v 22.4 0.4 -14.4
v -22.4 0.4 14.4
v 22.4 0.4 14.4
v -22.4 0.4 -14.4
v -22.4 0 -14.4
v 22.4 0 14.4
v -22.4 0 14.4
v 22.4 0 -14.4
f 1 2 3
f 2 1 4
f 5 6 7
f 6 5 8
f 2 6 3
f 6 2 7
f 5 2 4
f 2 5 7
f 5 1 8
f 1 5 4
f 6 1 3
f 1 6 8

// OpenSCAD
// file: ../p/4-4edge.scad
use <../lib.scad>
$fa=1; $fs=0.2;
function ldraw_lib__4_4edge(realsolid=false) = [
// 0 Circle 1.0
// 0 Name: 4-4edge.dat
// 0 Author: James Jessiman
// 0 !LDRAW_ORG Primitive UPDATE 2017-01
// 0 !LICENSE Licensed under CC BY 2.0 and CC BY 4.0 : see CAreadme.txt
// 
// 0 BFC CERTIFY CCW
  [0,"BFC","CERTIFY"],
  [0,"BFC","CCW"],
// 
// 0 !HISTORY 1998-12-15 [PTadmin] Official Update 1998-10
// 0 !HISTORY 2005-12-28 [PTadmin] Official Update 2005-01
// 0 !HISTORY 2007-06-24 [PTadmin] Header formatted for Contributor Agreement
// 0 !HISTORY 2008-07-01 [PTadmin] Official Update 2008-01
// 0 !HISTORY 2017-01-15 [Steffen] BFCed
// 0 !HISTORY 2017-12-30 [PTadmin] Official Update 2017-01
// 
// 
// 2 24 1 0 0 0.9239 0 0.3827
  [2,24,1,0,0,0.9239,0,0.3827],
// 2 24 0.9239 0 0.3827 0.7071 0 0.7071
  [2,24,0.9239,0,0.3827,0.7071,0,0.7071],
// 2 24 0.7071 0 0.7071 0.3827 0 0.9239
  [2,24,0.7071,0,0.7071,0.3827,0,0.9239],
// 2 24 0.3827 0 0.9239 0 0 1
  [2,24,0.3827,0,0.9239,0,0,1],
// 2 24 0 0 1 -0.3827 0 0.9239
  [2,24,0,0,1,-0.3827,0,0.9239],
// 2 24 -0.3827 0 0.9239 -0.7071 0 0.7071
  [2,24,-0.3827,0,0.9239,-0.7071,0,0.7071],
// 2 24 -0.7071 0 0.7071 -0.9239 0 0.3827
  [2,24,-0.7071,0,0.7071,-0.9239,0,0.3827],
// 2 24 -0.9239 0 0.3827 -1 0 -0
  [2,24,-0.9239,0,0.3827,-1,0,-0],
// 2 24 -1 0 -0 -0.9239 0 -0.3827
  [2,24,-1,0,-0,-0.9239,0,-0.3827],
// 2 24 -0.9239 0 -0.3827 -0.7071 0 -0.7071
  [2,24,-0.9239,0,-0.3827,-0.7071,0,-0.7071],
// 2 24 -0.7071 0 -0.7071 -0.3827 0 -0.9239
  [2,24,-0.7071,0,-0.7071,-0.3827,0,-0.9239],
// 2 24 -0.3827 0 -0.9239 0 0 -1
  [2,24,-0.3827,0,-0.9239,0,0,-1],
// 2 24 0 0 -1 0.3827 0 -0.9239
  [2,24,0,0,-1,0.3827,0,-0.9239],
// 2 24 0.3827 0 -0.9239 0.7071 0 -0.7071
  [2,24,0.3827,0,-0.9239,0.7071,0,-0.7071],
// 2 24 0.7071 0 -0.7071 0.9239 0 -0.3827
  [2,24,0.7071,0,-0.7071,0.9239,0,-0.3827],
// 2 24 0.9239 0 -0.3827 1 0 0
  [2,24,0.9239,0,-0.3827,1,0,0],
];
module ldraw_lib__4_4edge(step=0, col=false, unit=2/5, alt=false, line=0.2, solid=!$preview)
    makepoly(ldraw_lib__4_4edge(solid), step=step, col=col, unit=unit, alt=alt, line=line, solid=solid);
ldraw_lib__4_4edge(line=0.2);
// file: ../p/4-4disc.scad
use <../lib.scad>
$fa=1; $fs=0.2;
function ldraw_lib__4_4disc(realsolid=false) = [
// 0 Disc 1.0
// 0 Name: 4-4disc.dat
// 0 Author: James Jessiman
// 0 !LDRAW_ORG Primitive UPDATE 2002-02
// 0 !LICENSE Licensed under CC BY 2.0 and CC BY 4.0 : see CAreadme.txt
// 
// 0 BFC CERTIFY CCW
  [0,"BFC","CERTIFY"],
  [0,"BFC","CCW"],
// 
// 0 !HISTORY 1998-12-15 [PTadmin] Official Update 1998-10
// 0 !HISTORY 2002-03-23 [sbliss] Added BFC statement
// 0 !HISTORY 2002-04-25 [PTadmin] Official Update 2002-02
// 0 !HISTORY 2007-06-24 [PTadmin] Header formatted for Contributor Agreement
// 0 !HISTORY 2008-07-01 [PTadmin] Official Update 2008-01
// 
// 
// 3 16 0 0 0 1 0 0 0.9239 0 0.3827
  [3,16,0,0,0,1,0,0,0.9239,0,0.3827],
// 3 16 0 0 0 0.9239 0 0.3827 0.7071 0 0.7071
  [3,16,0,0,0,0.9239,0,0.3827,0.7071,0,0.7071],
// 3 16 0 0 0 0.7071 0 0.7071 0.3827 0 0.9239
  [3,16,0,0,0,0.7071,0,0.7071,0.3827,0,0.9239],
// 3 16 0 0 0 0.3827 0 0.9239 0 0 1
  [3,16,0,0,0,0.3827,0,0.9239,0,0,1],
// 3 16 0 0 0 0 0 1 -0.3827 0 0.9239
  [3,16,0,0,0,0,0,1,-0.3827,0,0.9239],
// 3 16 0 0 0 -0.3827 0 0.9239 -0.7071 0 0.7071
  [3,16,0,0,0,-0.3827,0,0.9239,-0.7071,0,0.7071],
// 3 16 0 0 0 -0.7071 0 0.7071 -0.9239 0 0.3827
  [3,16,0,0,0,-0.7071,0,0.7071,-0.9239,0,0.3827],
// 3 16 0 0 0 -0.9239 0 0.3827 -1 0 -0
  [3,16,0,0,0,-0.9239,0,0.3827,-1,0,-0],
// 3 16 0 0 0 -1 0 -0 -0.9239 0 -0.3827
  [3,16,0,0,0,-1,0,-0,-0.9239,0,-0.3827],
// 3 16 0 0 0 -0.9239 0 -0.3827 -0.7071 0 -0.7071
  [3,16,0,0,0,-0.9239,0,-0.3827,-0.7071,0,-0.7071],
// 3 16 0 0 0 -0.7071 0 -0.7071 -0.3827 0 -0.9239
  [3,16,0,0,0,-0.7071,0,-0.7071,-0.3827,0,-0.9239],
// 3 16 0 0 0 -0.3827 0 -0.9239 0 0 -1
  [3,16,0,0,0,-0.3827,0,-0.9239,0,0,-1],
// 3 16 0 0 0 0 0 -1 0.3827 0 -0.9239
  [3,16,0,0,0,0,0,-1,0.3827,0,-0.9239],
// 3 16 0 0 0 0.3827 0 -0.9239 0.7071 0 -0.7071
  [3,16,0,0,0,0.3827,0,-0.9239,0.7071,0,-0.7071],
// 3 16 0 0 0 0.7071 0 -0.7071 0.9239 0 -0.3827
  [3,16,0,0,0,0.7071,0,-0.7071,0.9239,0,-0.3827],
// 3 16 0 0 0 0.9239 0 -0.3827 1 0 0
  [3,16,0,0,0,0.9239,0,-0.3827,1,0,0],
// 0
];
module ldraw_lib__4_4disc(step=0, col=false, unit=2/5, alt=false, line=0.2, solid=!$preview)
    makepoly(ldraw_lib__4_4disc(solid), step=step, col=col, unit=unit, alt=alt, line=line, solid=solid);
ldraw_lib__4_4disc(line=0.2);
// file: ../p/4-4cyli.scad
use <../lib.scad>
$fa=1; $fs=0.2;
function ldraw_lib__4_4cyli(realsolid=false) = [
// 0 Cylinder 1.0
// 0 Name: 4-4cyli.dat
// 0 Author: James Jessiman
// 0 !LDRAW_ORG Primitive UPDATE 2005-01
// 0 !LICENSE Licensed under CC BY 2.0 and CC BY 4.0 : see CAreadme.txt
// 
// 0 BFC CERTIFY CCW
  [0,"BFC","CERTIFY"],
  [0,"BFC","CCW"],
// 
// 0 !HISTORY 1998-12-15 [PTadmin] Official Update 1998-10
// 0 !HISTORY 2002-03-23 [sbliss] Added BFC statement; merged headers from files in distributions LDraw 0.27 and Complete.
// 0 !HISTORY 2002-04-25 [PTadmin] Official Update 2002-02
// 0 !HISTORY 2004-12-14 [guyvivan] BFC CCW
// 0 !HISTORY 2005-12-28 [PTadmin] Official Update 2005-01
// 0 !HISTORY 2007-06-24 [PTadmin] Header formatted for Contributor Agreement
// 0 !HISTORY 2008-07-01 [PTadmin] Official Update 2008-01
// 
// 
// 4 16 1 1 0 0.9239 1 0.3827 0.9239 0 0.3827 1 0 0
  [4,16,1,1,0,0.9239,1,0.3827,0.9239,0,0.3827,1,0,0],
// 5 24 1 0 0 1 1 0 0.9239 0 0.3827 0.9239 0 -0.3827
  [5,24,1,0,0,1,1,0,0.9239,0,0.3827,0.9239,0,-0.3827],
// 4 16 0.9239 1 0.3827 0.7071 1 0.7071 0.7071 0 0.7071 0.9239 0 0.3827
  [4,16,0.9239,1,0.3827,0.7071,1,0.7071,0.7071,0,0.7071,0.9239,0,0.3827],
// 5 24 0.9239 0 0.3827 0.9239 1 0.3827 0.7071 0 0.7071 1 0 0
  [5,24,0.9239,0,0.3827,0.9239,1,0.3827,0.7071,0,0.7071,1,0,0],
// 4 16 0.7071 1 0.7071 0.3827 1 0.9239 0.3827 0 0.9239 0.7071 0 0.7071
  [4,16,0.7071,1,0.7071,0.3827,1,0.9239,0.3827,0,0.9239,0.7071,0,0.7071],
// 5 24 0.7071 0 0.7071 0.7071 1 0.7071 0.3827 0 0.9239 0.9239 0 0.3827
  [5,24,0.7071,0,0.7071,0.7071,1,0.7071,0.3827,0,0.9239,0.9239,0,0.3827],
// 4 16 0.3827 1 0.9239 0 1 1 0 0 1 0.3827 0 0.9239
  [4,16,0.3827,1,0.9239,0,1,1,0,0,1,0.3827,0,0.9239],
// 5 24 0.3827 0 0.9239 0.3827 1 0.9239 0 0 1 0.7071 0 0.7071
  [5,24,0.3827,0,0.9239,0.3827,1,0.9239,0,0,1,0.7071,0,0.7071],
// 4 16 0 1 1 -0.3827 1 0.9239 -0.3827 0 0.9239 0 0 1
  [4,16,0,1,1,-0.3827,1,0.9239,-0.3827,0,0.9239,0,0,1],
// 5 24 0 0 1 0 1 1 -0.3827 0 0.9239 0.3827 0 0.9239
  [5,24,0,0,1,0,1,1,-0.3827,0,0.9239,0.3827,0,0.9239],
// 4 16 -0.3827 1 0.9239 -0.7071 1 0.7071 -0.7071 0 0.7071 -0.3827 0 0.9239
  [4,16,-0.3827,1,0.9239,-0.7071,1,0.7071,-0.7071,0,0.7071,-0.3827,0,0.9239],
// 5 24 -0.3827 0 0.9239 -0.3827 1 0.9239 -0.7071 0 0.7071 0 0 1
  [5,24,-0.3827,0,0.9239,-0.3827,1,0.9239,-0.7071,0,0.7071,0,0,1],
// 4 16 -0.7071 1 0.7071 -0.9239 1 0.3827 -0.9239 0 0.3827 -0.7071 0 0.7071
  [4,16,-0.7071,1,0.7071,-0.9239,1,0.3827,-0.9239,0,0.3827,-0.7071,0,0.7071],
// 5 24 -0.7071 0 0.7071 -0.7071 1 0.7071 -0.9239 0 0.3827 -0.3827 0 0.9239
  [5,24,-0.7071,0,0.7071,-0.7071,1,0.7071,-0.9239,0,0.3827,-0.3827,0,0.9239],
// 4 16 -0.9239 1 0.3827 -1 1 0 -1 0 0 -0.9239 0 0.3827
  [4,16,-0.9239,1,0.3827,-1,1,0,-1,0,0,-0.9239,0,0.3827],
// 5 24 -0.9239 0 0.3827 -0.9239 1 0.3827 -1 0 0 -0.7071 0 0.7071
  [5,24,-0.9239,0,0.3827,-0.9239,1,0.3827,-1,0,0,-0.7071,0,0.7071],
// 4 16 -1 1 0 -0.9239 1 -0.3827 -0.9239 0 -0.3827 -1 0 0
  [4,16,-1,1,0,-0.9239,1,-0.3827,-0.9239,0,-0.3827,-1,0,0],
// 5 24 -1 0 0 -1 1 0 -0.9239 0 -0.3827 -0.9239 0 0.3827
  [5,24,-1,0,0,-1,1,0,-0.9239,0,-0.3827,-0.9239,0,0.3827],
// 4 16 -0.9239 1 -0.3827 -0.7071 1 -0.7071 -0.7071 0 -0.7071 -0.9239 0 -0.3827
  [4,16,-0.9239,1,-0.3827,-0.7071,1,-0.7071,-0.7071,0,-0.7071,-0.9239,0,-0.3827],
// 5 24 -0.9239 0 -0.3827 -0.9239 1 -0.3827 -0.7071 0 -0.7071 -1 0 0
  [5,24,-0.9239,0,-0.3827,-0.9239,1,-0.3827,-0.7071,0,-0.7071,-1,0,0],
// 4 16 -0.7071 1 -0.7071 -0.3827 1 -0.9239 -0.3827 0 -0.9239 -0.7071 0 -0.7071
  [4,16,-0.7071,1,-0.7071,-0.3827,1,-0.9239,-0.3827,0,-0.9239,-0.7071,0,-0.7071],
// 5 24 -0.7071 0 -0.7071 -0.7071 1 -0.7071 -0.3827 0 -0.9239 -0.9239 0 -0.3827
  [5,24,-0.7071,0,-0.7071,-0.7071,1,-0.7071,-0.3827,0,-0.9239,-0.9239,0,-0.3827],
// 4 16 -0.3827 1 -0.9239 0 1 -1 0 0 -1 -0.3827 0 -0.9239
  [4,16,-0.3827,1,-0.9239,0,1,-1,0,0,-1,-0.3827,0,-0.9239],
// 5 24 -0.3827 0 -0.9239 -0.3827 1 -0.9239 0 0 -1 -0.7071 0 -0.7071
  [5,24,-0.3827,0,-0.9239,-0.3827,1,-0.9239,0,0,-1,-0.7071,0,-0.7071],
// 4 16 0 1 -1 0.3827 1 -0.9239 0.3827 0 -0.9239 0 0 -1
  [4,16,0,1,-1,0.3827,1,-0.9239,0.3827,0,-0.9239,0,0,-1],
// 5 24 0 0 -1 0 1 -1 0.3827 0 -0.9239 -0.3827 0 -0.9239
  [5,24,0,0,-1,0,1,-1,0.3827,0,-0.9239,-0.3827,0,-0.9239],
// 4 16 0.3827 1 -0.9239 0.7071 1 -0.7071 0.7071 0 -0.7071 0.3827 0 -0.9239
  [4,16,0.3827,1,-0.9239,0.7071,1,-0.7071,0.7071,0,-0.7071,0.3827,0,-0.9239],
// 5 24 0.3827 0 -0.9239 0.3827 1 -0.9239 0.7071 0 -0.7071 0 0 -1
  [5,24,0.3827,0,-0.9239,0.3827,1,-0.9239,0.7071,0,-0.7071,0,0,-1],
// 4 16 0.7071 1 -0.7071 0.9239 1 -0.3827 0.9239 0 -0.3827 0.7071 0 -0.7071
  [4,16,0.7071,1,-0.7071,0.9239,1,-0.3827,0.9239,0,-0.3827,0.7071,0,-0.7071],
// 5 24 0.7071 0 -0.7071 0.7071 1 -0.7071 0.9239 0 -0.3827 0.3827 0 -0.9239
  [5,24,0.7071,0,-0.7071,0.7071,1,-0.7071,0.9239,0,-0.3827,0.3827,0,-0.9239],
// 4 16 0.9239 1 -0.3827 1 1 0 1 0 0 0.9239 0 -0.3827
  [4,16,0.9239,1,-0.3827,1,1,0,1,0,0,0.9239,0,-0.3827],
// 5 24 0.9239 0 -0.3827 0.9239 1 -0.3827 1 0 0 0.7071 0 -0.7071
  [5,24,0.9239,0,-0.3827,0.9239,1,-0.3827,1,0,0,0.7071,0,-0.7071],
// 0
];
module ldraw_lib__4_4cyli(step=0, col=false, unit=2/5, alt=false, line=0.2, solid=!$preview)
    makepoly(ldraw_lib__4_4cyli(solid), step=step, col=col, unit=unit, alt=alt, line=line, solid=solid);
ldraw_lib__4_4cyli(line=0.2);
// file: ../p/stud3.scad
use <../lib.scad>
use <4-4cyli.scad>
use <4-4disc.scad>
use <4-4edge.scad>
$fa=1; $fs=0.2;
function ldraw_lib__stud3(realsolid=false) = realsolid ? 
    [openscad(translate([0,0,-eps()], o=cylinder(4+eps(), r=4)),2)] : [
// 0 Stud Tube Solid
// 0 Name: stud3.dat
// 0 Author: James Jessiman
// 0 !LDRAW_ORG Primitive UPDATE 2012-01
// 0 !LICENSE Licensed under CC BY 2.0 and CC BY 4.0 : see CAreadme.txt
// 
// 0 BFC CERTIFY CCW
  [0,"BFC","CERTIFY"],
  [0,"BFC","CCW"],
// 
// 0 !HISTORY 2002-04-04 [sbliss] Modified for BFC compliance
// 0 !HISTORY 2002-04-25 [PTadmin] Official Update 2002-02
// 0 !HISTORY 2007-06-24 [PTadmin] Header formatted for Contributor Agreement
// 0 !HISTORY 2008-07-01 [PTadmin] Official Update 2008-01
// 0 !HISTORY 2012-02-16 [Philo] Changed to CCW
// 0 !HISTORY 2012-03-30 [PTadmin] Official Update 2012-01
// 
// 
// 1 16 0 -4 0 4 0 0 0 1 0 0 0 4 4-4edge.dat
  [1,16,0,-4,0,4,0,0,0,1,0,0,0,4, ldraw_lib__4_4edge(realsolid)],
// 1 16 0 0 0 4 0 0 0 1 0 0 0 4 4-4edge.dat
  [1,16,0,0,0,4,0,0,0,1,0,0,0,4, ldraw_lib__4_4edge(realsolid)],
// 1 16 0 -4 0 4 0 0 0 1 0 0 0 4 4-4disc.dat
  [1,16,0,-4,0,4,0,0,0,1,0,0,0,4, ldraw_lib__4_4disc(realsolid)],
// 1 16 0 -4 0 4 0 0 0 4 0 0 0 4 4-4cyli.dat
  [1,16,0,-4,0,4,0,0,0,4,0,0,0,4, ldraw_lib__4_4cyli(realsolid)],
];
module ldraw_lib__stud3(step=0, col=false, unit=2/5, alt=false, line=0.2, solid=!$preview)
    makepoly(ldraw_lib__stud3(solid), step=step, col=col, unit=unit, alt=alt, line=line, solid=solid);
ldraw_lib__stud3(line=0.2);
// file: ../p/stud.scad
use <../lib.scad>
use <4-4cyli.scad>
use <4-4disc.scad>
use <4-4edge.scad>
$fa=1; $fs=0.2;
function ldraw_lib__stud(realsolid=false) = realsolid ? 
    [openscad(translate([0,0,-eps()], o=cylinder(4+eps(), r=6)),2)] : [
// 0 Stud
// 0 Name: stud.dat
// 0 Author: James Jessiman
// 0 !LDRAW_ORG Primitive UPDATE 2012-01
// 0 !LICENSE Licensed under CC BY 2.0 and CC BY 4.0 : see CAreadme.txt
// 
// 0 BFC CERTIFY CCW
  [0,"BFC","CERTIFY"],
  [0,"BFC","CCW"],
// 
// 0 !HISTORY 2002-04-04 [sbliss] Modified for BFC compliance
// 0 !HISTORY 2002-04-25 [PTadmin] Official Update 2002-02
// 0 !HISTORY 2007-06-24 [PTadmin] Header formatted for Contributor Agreement
// 0 !HISTORY 2008-07-01 [PTadmin] Official Update 2008-01
// 0 !HISTORY 2012-02-16 [Philo] Changed to CCW
// 0 !HISTORY 2012-03-30 [PTadmin] Official Update 2012-01
// 
// 
// 1 16 0 0 0 6 0 0 0 1 0 0 0 6 4-4edge.dat
  [1,16,0,0,0,6,0,0,0,1,0,0,0,6, ldraw_lib__4_4edge(realsolid)],
// 1 16 0 -4 0 6 0 0 0 1 0 0 0 6 4-4edge.dat
  [1,16,0,-4,0,6,0,0,0,1,0,0,0,6, ldraw_lib__4_4edge(realsolid)],
// 1 16 0 0 0 6 0 0 0 -4 0 0 0 6 4-4cyli.dat
  [1,16,0,0,0,6,0,0,0,-4,0,0,0,6, ldraw_lib__4_4cyli(realsolid)],
// 1 16 0 -4 0 6 0 0 0 1 0 0 0 6 4-4disc.dat
  [1,16,0,-4,0,6,0,0,0,1,0,0,0,6, ldraw_lib__4_4disc(realsolid)],
];
module ldraw_lib__stud(step=0, col=false, unit=2/5, alt=false, line=0.2, solid=!$preview)
    makepoly(ldraw_lib__stud(solid), step=step, col=col, unit=unit, alt=alt, line=line, solid=solid);
ldraw_lib__stud(line=0.2);
// file: ../p/box5.scad
use <../lib.scad>
$fa=1; $fs=0.2;
function ldraw_lib__box5(realsolid=false) = [
// 0 Box with 5 Faces and All Edges
// 0 Name: box5.dat
// 0 Author: James Jessiman
// 0 !LDRAW_ORG Primitive UPDATE 2012-01
// 0 !LICENSE Licensed under CC BY 2.0 and CC BY 4.0 : see CAreadme.txt
// 
// 0 BFC CERTIFY CCW
  [0,"BFC","CERTIFY"],
  [0,"BFC","CCW"],
// 
// 0 !HISTORY 2002-04-03 [sbliss] Modified for BFC compliance
// 0 !HISTORY 2002-04-25 [PTadmin] Official Update 2002-02
// 0 !HISTORY 2007-06-24 [PTadmin] Header formatted for Contributor Agreement
// 0 !HISTORY 2008-07-01 [PTadmin] Official Update 2008-01
// 0 !HISTORY 2012-02-16 [Philo] Changed to CCW
// 0 !HISTORY 2012-03-30 [PTadmin] Official Update 2012-01
// 
// 
// 2 24 1 1 1 -1 1 1
  [2,24,1,1,1,-1,1,1],
// 2 24 -1 1 1 -1 1 -1
  [2,24,-1,1,1,-1,1,-1],
// 2 24 -1 1 -1 1 1 -1
  [2,24,-1,1,-1,1,1,-1],
// 2 24 1 1 -1 1 1 1
  [2,24,1,1,-1,1,1,1],
// 2 24 1 0 1 -1 0 1
  [2,24,1,0,1,-1,0,1],
// 2 24 -1 0 1 -1 0 -1
  [2,24,-1,0,1,-1,0,-1],
// 2 24 -1 0 -1 1 0 -1
  [2,24,-1,0,-1,1,0,-1],
// 2 24 1 0 -1 1 0 1
  [2,24,1,0,-1,1,0,1],
// 2 24 1 0 1 1 1 1
  [2,24,1,0,1,1,1,1],
// 2 24 -1 0 1 -1 1 1
  [2,24,-1,0,1,-1,1,1],
// 2 24 1 0 -1 1 1 -1
  [2,24,1,0,-1,1,1,-1],
// 2 24 -1 0 -1 -1 1 -1
  [2,24,-1,0,-1,-1,1,-1],
// 4 16 -1 1 1 1 1 1 1 1 -1 -1 1 -1
  [4,16,-1,1,1,1,1,1,1,1,-1,-1,1,-1],
// 4 16 -1 1 1 -1 0 1 1 0 1 1 1 1
  [4,16,-1,1,1,-1,0,1,1,0,1,1,1,1],
// 4 16 -1 1 -1 -1 0 -1 -1 0 1 -1 1 1
  [4,16,-1,1,-1,-1,0,-1,-1,0,1,-1,1,1],
// 4 16 1 1 -1 1 0 -1 -1 0 -1 -1 1 -1
  [4,16,1,1,-1,1,0,-1,-1,0,-1,-1,1,-1],
// 4 16 1 1 1 1 0 1 1 0 -1 1 1 -1
  [4,16,1,1,1,1,0,1,1,0,-1,1,1,-1],
];
module ldraw_lib__box5(step=0, col=false, unit=2/5, alt=false, line=0.2, solid=!$preview)
    makepoly(ldraw_lib__box5(solid), step=step, col=col, unit=unit, alt=alt, line=line, solid=solid);
ldraw_lib__box5(line=0.2);
// file: ../p/box4t.scad
use <../lib.scad>
$fa=1; $fs=0.2;
function ldraw_lib__box4t(realsolid=false) = [
// 0 Box with 4 Adjacent Faces and All Edges
// 0 Name: box4t.dat
// 0 Author: Tore Eriksson [Tore_Eriksson]
// 0 !LDRAW_ORG Primitive UPDATE 2003-02
// 0 !LICENSE Licensed under CC BY 2.0 and CC BY 4.0 : see CAreadme.txt
// 
// 0 BFC CERTIFY CCW
  [0,"BFC","CERTIFY"],
  [0,"BFC","CCW"],
// 
// 0 !HISTORY 1997-09-29 [PTadmin] Official Update 1997-15
// 0 !HISTORY 2002-08-31 [izanette] Modified with WINDZ for BFC compliance
// 0 !HISTORY 2003-08-01 [PTadmin] Official Update 2003-02
// 0 !HISTORY 2007-06-24 [PTadmin] Header formatted for Contributor Agreement
// 0 !HISTORY 2008-07-01 [PTadmin] Official Update 2008-01
// 
// 
// 2 24 1 1 1 -1 1 1
  [2,24,1,1,1,-1,1,1],
// 2 24 -1 1 1 -1 1 -1
  [2,24,-1,1,1,-1,1,-1],
// 2 24 -1 1 -1 1 1 -1
  [2,24,-1,1,-1,1,1,-1],
// 2 24 1 1 -1 1 1 1
  [2,24,1,1,-1,1,1,1],
// 2 24 1 0 1 -1 0 1
  [2,24,1,0,1,-1,0,1],
// 2 24 -1 0 1 -1 0 -1
  [2,24,-1,0,1,-1,0,-1],
// 2 24 -1 0 -1 1 0 -1
  [2,24,-1,0,-1,1,0,-1],
// 2 24 1 0 -1 1 0 1
  [2,24,1,0,-1,1,0,1],
// 2 24 1 0 1 1 1 1
  [2,24,1,0,1,1,1,1],
// 2 24 -1 0 1 -1 1 1
  [2,24,-1,0,1,-1,1,1],
// 2 24 1 0 -1 1 1 -1
  [2,24,1,0,-1,1,1,-1],
// 2 24 -1 0 -1 -1 1 -1
  [2,24,-1,0,-1,-1,1,-1],
// 4 16 1 1 1 1 1 -1 -1 1 -1 -1 1 1
  [4,16,1,1,1,1,1,-1,-1,1,-1,-1,1,1],
// 4 16 1 1 1 -1 1 1 -1 0 1 1 0 1
  [4,16,1,1,1,-1,1,1,-1,0,1,1,0,1],
// 4 16 -1 1 1 -1 1 -1 -1 0 -1 -1 0 1
  [4,16,-1,1,1,-1,1,-1,-1,0,-1,-1,0,1],
// 0 4 16 -1 1 -1 -1 0 -1 1 0 -1 1 1 -1
// 4 16 1 1 -1 1 1 1 1 0 1 1 0 -1
  [4,16,1,1,-1,1,1,1,1,0,1,1,0,-1],
// 0
];
module ldraw_lib__box4t(step=0, col=false, unit=2/5, alt=false, line=0.2, solid=!$preview)
    makepoly(ldraw_lib__box4t(solid), step=step, col=col, unit=unit, alt=alt, line=line, solid=solid);
ldraw_lib__box4t(line=0.2);
// file: s/3004s01.scad
use <../../lib.scad>
use <../../p/box4t.scad>
use <../../p/box5.scad>
use <../../p/stud.scad>
use <../../p/stud3.scad>
$fa=1; $fs=0.2;
function ldraw_lib__s__3004s01(realsolid=false) = [
// 0 ~Brick  1 x  2 without Front Face
// 0 Name: s\3004s01.dat
// 0 Author: James Jessiman
// 0 !LDRAW_ORG Subpart UPDATE 2003-03
// 0 !LICENSE Licensed under CC BY 2.0 and CC BY 4.0 : see CAreadme.txt
// 
// 0 BFC CERTIFY CCW
  [0,"BFC","CERTIFY"],
  [0,"BFC","CCW"],
// 
// 0 !HISTORY 2003-09-07 [jriley] Subfiling, BFC
// 0 !HISTORY 2003-12-19 [PTadmin] Official Update 2003-03
// 0 !HISTORY 2007-08-29 [PTadmin] Header formatted for Contributor Agreement
// 0 !HISTORY 2008-07-01 [PTadmin] Official Update 2008-01
// 
// 
// 1 16 0 4 0 1 0 0 0 -5 0 0 0 1 stud3.dat
  [1,16,0,4,0,1,0,0,0,-5,0,0,0,1, ldraw_lib__stud3(realsolid)],
// 0 BFC INVERTNEXT
  [0,"BFC","INVERTNEXT"],
// 1 16 0 24 0 16 0 0 0 -20 0 0 0 6 box5.dat
  [1,16,0,24,0,16,0,0,0,-20,0,0,0,6, ldraw_lib__box5(realsolid)],
// 4 16 20 24 10 16 24 6 -16 24 6 -20 24 10
  [4,16,20,24,10,16,24,6,-16,24,6,-20,24,10],
// 4 16 -20 24 10 -16 24 6 -16 24 -6 -20 24 -10
  [4,16,-20,24,10,-16,24,6,-16,24,-6,-20,24,-10],
// 4 16 -20 24 -10 -16 24 -6 16 24 -6 20 24 -10
  [4,16,-20,24,-10,-16,24,-6,16,24,-6,20,24,-10],
// 4 16 20 24 -10 16 24 -6 16 24 6 20 24 10
  [4,16,20,24,-10,16,24,-6,16,24,6,20,24,10],
// 1 16 0 24 0 20 0 0 0 -24 0 0 0 10 box4t.dat
  [1,16,0,24,0,20,0,0,0,-24,0,0,0,10, ldraw_lib__box4t(realsolid)],
// 1 16 10 0 0 1 0 0 0 1 0 0 0 1 stud.dat
  [1,16,10,0,0,1,0,0,0,1,0,0,0,1, ldraw_lib__stud(realsolid)],
// 1 16 -10 0 0 1 0 0 0 1 0 0 0 1 stud.dat
  [1,16,-10,0,0,1,0,0,0,1,0,0,0,1, ldraw_lib__stud(realsolid)],
// 0
];
module ldraw_lib__s__3004s01(step=0, col=false, unit=2/5, alt=false, line=0.2, solid=!$preview)
    makepoly(ldraw_lib__s__3004s01(solid), step=step, col=col, unit=unit, alt=alt, line=line, solid=solid);
ldraw_lib__s__3004s01(line=0.2);
// file: 3004.scad
use <../lib.scad>
use <s/3004s01.scad>
$fa=1; $fs=0.2;
function ldraw_lib__3004(realsolid=false) = [
// 0 Brick  1 x  2
// 0 Name: 3004.dat
// 0 Author: James Jessiman
// 0 !LDRAW_ORG Part UPDATE 2022-05
// 0 !LICENSE Licensed under CC BY 2.0 and CC BY 4.0 : see CAreadme.txt
// 
// 0 BFC CERTIFY CCW
  [0,"BFC","CERTIFY"],
  [0,"BFC","CCW"],
// 
// 0 !HISTORY 2001-10-26 [PTadmin] Official Update 2001-01
// 0 !HISTORY 2002-05-07 {unknown} BFC Certification
// 0 !HISTORY 2002-06-11 [PTadmin] Official Update 2002-03
// 0 !HISTORY 2007-05-07 [PTadmin] Header formatted for Contributor Agreement
// 0 !HISTORY 2008-07-01 [PTadmin] Official Update 2008-01
// 0 !HISTORY 2022-08-04 [MagFors] Using subfile
// 0 !HISTORY 2022-09-15 [PTadmin] Official Update 2022-05
// 
// 
// 1 16 0 0 0 1 0 0 0 1 0 0 0 1 s\3004s01.dat
  [1,16,0,0,0,1,0,0,0,1,0,0,0,1, ldraw_lib__s__3004s01(realsolid)],
// 4 16 -20 24 -10 20 24 -10 20 0 -10 -20 0 -10
  [4,16,-20,24,-10,20,24,-10,20,0,-10,-20,0,-10],
];
module ldraw_lib__3004(step=0, col=false, unit=2/5, alt=false, line=0.2, solid=!$preview)
    makepoly(ldraw_lib__3004(solid), step=step, col=col, unit=unit, alt=alt, line=line, solid=solid);
ldraw_lib__3004(line=0.2);
// file: ../p/box.scad
use <../lib.scad>
$fa=1; $fs=0.2;
function ldraw_lib__box(realsolid=false) = [
// 0 Box 6 (six faces)
// 0 Name: box.dat
// 0 Author: James Jessiman
// 0 !LDRAW_ORG Primitive UPDATE 2002-05
// 0 !LICENSE Licensed under CC BY 2.0 and CC BY 4.0 : see CAreadme.txt
// 
// 0 BFC CERTIFY CCW
  [0,"BFC","CERTIFY"],
  [0,"BFC","CCW"],
// 
// 0 !HISTORY 2002-08-22 [sbliss] Applied BFC
// 0 !HISTORY 2002-11-30 [PTadmin] Official Update 2002-05
// 0 !HISTORY 2007-06-24 [PTadmin] Header formatted for Contributor Agreement
// 0 !HISTORY 2008-07-01 [PTadmin] Official Update 2008-01
// 
// 
// 2 24 1 1 1 -1 1 1
  [2,24,1,1,1,-1,1,1],
// 2 24 -1 1 1 -1 1 -1
  [2,24,-1,1,1,-1,1,-1],
// 2 24 -1 1 -1 1 1 -1
  [2,24,-1,1,-1,1,1,-1],
// 2 24 1 1 -1 1 1 1
  [2,24,1,1,-1,1,1,1],
// 2 24 1 -1 1 -1 -1 1
  [2,24,1,-1,1,-1,-1,1],
// 2 24 -1 -1 1 -1 -1 -1
  [2,24,-1,-1,1,-1,-1,-1],
// 2 24 -1 -1 -1 1 -1 -1
  [2,24,-1,-1,-1,1,-1,-1],
// 2 24 1 -1 -1 1 -1 1
  [2,24,1,-1,-1,1,-1,1],
// 2 24 1 -1 1 1 1 1
  [2,24,1,-1,1,1,1,1],
// 2 24 -1 -1 1 -1 1 1
  [2,24,-1,-1,1,-1,1,1],
// 2 24 1 -1 -1 1 1 -1
  [2,24,1,-1,-1,1,1,-1],
// 2 24 -1 -1 -1 -1 1 -1
  [2,24,-1,-1,-1,-1,1,-1],
// 4 16 1 1 1 1 1 -1 -1 1 -1 -1 1 1
  [4,16,1,1,1,1,1,-1,-1,1,-1,-1,1,1],
// 4 16 -1 -1 -1 1 -1 -1 1 -1 1 -1 -1 1
  [4,16,-1,-1,-1,1,-1,-1,1,-1,1,-1,-1,1],
// 4 16 -1 -1 1 1 -1 1 1 1 1 -1 1 1
  [4,16,-1,-1,1,1,-1,1,1,1,1,-1,1,1],
// 4 16 -1 -1 -1 -1 -1 1 -1 1 1 -1 1 -1
  [4,16,-1,-1,-1,-1,-1,1,-1,1,1,-1,1,-1],
// 4 16 1 -1 -1 -1 -1 -1 -1 1 -1 1 1 -1
  [4,16,1,-1,-1,-1,-1,-1,-1,1,-1,1,1,-1],
// 4 16 1 -1 1 1 -1 -1 1 1 -1 1 1 1
  [4,16,1,-1,1,1,-1,-1,1,1,-1,1,1,1],
// 0
];
module ldraw_lib__box(step=0, col=false, unit=2/5, alt=false, line=0.2, solid=!$preview)
    makepoly(ldraw_lib__box(solid), step=step, col=col, unit=unit, alt=alt, line=line, solid=solid);
ldraw_lib__box(line=0.2);
// main file
use <../lib.scad>
use <../p/box.scad>
$fa=1; $fs=0.2;
function ldraw_lib__u8031(realsolid=false) = [
// 0 ~Mursten Glass for Window  1 x  6 x  4 Panorama
// 0 Name: u8031.dat
// 0 Author: Steffen [Steffen]
// 0 !LDRAW_ORG Part UPDATE 2013-02
// 0 !LICENSE Licensed under CC BY 2.0 and CC BY 4.0 : see CAreadme.txt
// 
// 0 BFC CERTIFY CW
  [0,"BFC","CERTIFY"],
  [0,"BFC","CW"],
// 
// 0 !CATEGORY Window
// 0 !KEYWORDS Automatic Binding Brick, Lego Mursten
// 
// 0 !HISTORY 2013-12-23 [PTadmin] Official Update 2013-02
// 
// 
// 1 16 0 0 0.5 56 0 0 0 0 -36 0 0.5 0 box.dat
  [1,16,0,0,0.5,56,0,0,0,0,-36,0,0.5,0, ldraw_lib__box(realsolid)],
];
module ldraw_lib__u8031(step=0, col=false, unit=2/5, alt=false, line=0.2, solid=!$preview)
    makepoly(ldraw_lib__u8031(solid), step=step, col=col, unit=unit, alt=alt, line=line, solid=solid);
ldraw_lib__u8031(line=0.2);
